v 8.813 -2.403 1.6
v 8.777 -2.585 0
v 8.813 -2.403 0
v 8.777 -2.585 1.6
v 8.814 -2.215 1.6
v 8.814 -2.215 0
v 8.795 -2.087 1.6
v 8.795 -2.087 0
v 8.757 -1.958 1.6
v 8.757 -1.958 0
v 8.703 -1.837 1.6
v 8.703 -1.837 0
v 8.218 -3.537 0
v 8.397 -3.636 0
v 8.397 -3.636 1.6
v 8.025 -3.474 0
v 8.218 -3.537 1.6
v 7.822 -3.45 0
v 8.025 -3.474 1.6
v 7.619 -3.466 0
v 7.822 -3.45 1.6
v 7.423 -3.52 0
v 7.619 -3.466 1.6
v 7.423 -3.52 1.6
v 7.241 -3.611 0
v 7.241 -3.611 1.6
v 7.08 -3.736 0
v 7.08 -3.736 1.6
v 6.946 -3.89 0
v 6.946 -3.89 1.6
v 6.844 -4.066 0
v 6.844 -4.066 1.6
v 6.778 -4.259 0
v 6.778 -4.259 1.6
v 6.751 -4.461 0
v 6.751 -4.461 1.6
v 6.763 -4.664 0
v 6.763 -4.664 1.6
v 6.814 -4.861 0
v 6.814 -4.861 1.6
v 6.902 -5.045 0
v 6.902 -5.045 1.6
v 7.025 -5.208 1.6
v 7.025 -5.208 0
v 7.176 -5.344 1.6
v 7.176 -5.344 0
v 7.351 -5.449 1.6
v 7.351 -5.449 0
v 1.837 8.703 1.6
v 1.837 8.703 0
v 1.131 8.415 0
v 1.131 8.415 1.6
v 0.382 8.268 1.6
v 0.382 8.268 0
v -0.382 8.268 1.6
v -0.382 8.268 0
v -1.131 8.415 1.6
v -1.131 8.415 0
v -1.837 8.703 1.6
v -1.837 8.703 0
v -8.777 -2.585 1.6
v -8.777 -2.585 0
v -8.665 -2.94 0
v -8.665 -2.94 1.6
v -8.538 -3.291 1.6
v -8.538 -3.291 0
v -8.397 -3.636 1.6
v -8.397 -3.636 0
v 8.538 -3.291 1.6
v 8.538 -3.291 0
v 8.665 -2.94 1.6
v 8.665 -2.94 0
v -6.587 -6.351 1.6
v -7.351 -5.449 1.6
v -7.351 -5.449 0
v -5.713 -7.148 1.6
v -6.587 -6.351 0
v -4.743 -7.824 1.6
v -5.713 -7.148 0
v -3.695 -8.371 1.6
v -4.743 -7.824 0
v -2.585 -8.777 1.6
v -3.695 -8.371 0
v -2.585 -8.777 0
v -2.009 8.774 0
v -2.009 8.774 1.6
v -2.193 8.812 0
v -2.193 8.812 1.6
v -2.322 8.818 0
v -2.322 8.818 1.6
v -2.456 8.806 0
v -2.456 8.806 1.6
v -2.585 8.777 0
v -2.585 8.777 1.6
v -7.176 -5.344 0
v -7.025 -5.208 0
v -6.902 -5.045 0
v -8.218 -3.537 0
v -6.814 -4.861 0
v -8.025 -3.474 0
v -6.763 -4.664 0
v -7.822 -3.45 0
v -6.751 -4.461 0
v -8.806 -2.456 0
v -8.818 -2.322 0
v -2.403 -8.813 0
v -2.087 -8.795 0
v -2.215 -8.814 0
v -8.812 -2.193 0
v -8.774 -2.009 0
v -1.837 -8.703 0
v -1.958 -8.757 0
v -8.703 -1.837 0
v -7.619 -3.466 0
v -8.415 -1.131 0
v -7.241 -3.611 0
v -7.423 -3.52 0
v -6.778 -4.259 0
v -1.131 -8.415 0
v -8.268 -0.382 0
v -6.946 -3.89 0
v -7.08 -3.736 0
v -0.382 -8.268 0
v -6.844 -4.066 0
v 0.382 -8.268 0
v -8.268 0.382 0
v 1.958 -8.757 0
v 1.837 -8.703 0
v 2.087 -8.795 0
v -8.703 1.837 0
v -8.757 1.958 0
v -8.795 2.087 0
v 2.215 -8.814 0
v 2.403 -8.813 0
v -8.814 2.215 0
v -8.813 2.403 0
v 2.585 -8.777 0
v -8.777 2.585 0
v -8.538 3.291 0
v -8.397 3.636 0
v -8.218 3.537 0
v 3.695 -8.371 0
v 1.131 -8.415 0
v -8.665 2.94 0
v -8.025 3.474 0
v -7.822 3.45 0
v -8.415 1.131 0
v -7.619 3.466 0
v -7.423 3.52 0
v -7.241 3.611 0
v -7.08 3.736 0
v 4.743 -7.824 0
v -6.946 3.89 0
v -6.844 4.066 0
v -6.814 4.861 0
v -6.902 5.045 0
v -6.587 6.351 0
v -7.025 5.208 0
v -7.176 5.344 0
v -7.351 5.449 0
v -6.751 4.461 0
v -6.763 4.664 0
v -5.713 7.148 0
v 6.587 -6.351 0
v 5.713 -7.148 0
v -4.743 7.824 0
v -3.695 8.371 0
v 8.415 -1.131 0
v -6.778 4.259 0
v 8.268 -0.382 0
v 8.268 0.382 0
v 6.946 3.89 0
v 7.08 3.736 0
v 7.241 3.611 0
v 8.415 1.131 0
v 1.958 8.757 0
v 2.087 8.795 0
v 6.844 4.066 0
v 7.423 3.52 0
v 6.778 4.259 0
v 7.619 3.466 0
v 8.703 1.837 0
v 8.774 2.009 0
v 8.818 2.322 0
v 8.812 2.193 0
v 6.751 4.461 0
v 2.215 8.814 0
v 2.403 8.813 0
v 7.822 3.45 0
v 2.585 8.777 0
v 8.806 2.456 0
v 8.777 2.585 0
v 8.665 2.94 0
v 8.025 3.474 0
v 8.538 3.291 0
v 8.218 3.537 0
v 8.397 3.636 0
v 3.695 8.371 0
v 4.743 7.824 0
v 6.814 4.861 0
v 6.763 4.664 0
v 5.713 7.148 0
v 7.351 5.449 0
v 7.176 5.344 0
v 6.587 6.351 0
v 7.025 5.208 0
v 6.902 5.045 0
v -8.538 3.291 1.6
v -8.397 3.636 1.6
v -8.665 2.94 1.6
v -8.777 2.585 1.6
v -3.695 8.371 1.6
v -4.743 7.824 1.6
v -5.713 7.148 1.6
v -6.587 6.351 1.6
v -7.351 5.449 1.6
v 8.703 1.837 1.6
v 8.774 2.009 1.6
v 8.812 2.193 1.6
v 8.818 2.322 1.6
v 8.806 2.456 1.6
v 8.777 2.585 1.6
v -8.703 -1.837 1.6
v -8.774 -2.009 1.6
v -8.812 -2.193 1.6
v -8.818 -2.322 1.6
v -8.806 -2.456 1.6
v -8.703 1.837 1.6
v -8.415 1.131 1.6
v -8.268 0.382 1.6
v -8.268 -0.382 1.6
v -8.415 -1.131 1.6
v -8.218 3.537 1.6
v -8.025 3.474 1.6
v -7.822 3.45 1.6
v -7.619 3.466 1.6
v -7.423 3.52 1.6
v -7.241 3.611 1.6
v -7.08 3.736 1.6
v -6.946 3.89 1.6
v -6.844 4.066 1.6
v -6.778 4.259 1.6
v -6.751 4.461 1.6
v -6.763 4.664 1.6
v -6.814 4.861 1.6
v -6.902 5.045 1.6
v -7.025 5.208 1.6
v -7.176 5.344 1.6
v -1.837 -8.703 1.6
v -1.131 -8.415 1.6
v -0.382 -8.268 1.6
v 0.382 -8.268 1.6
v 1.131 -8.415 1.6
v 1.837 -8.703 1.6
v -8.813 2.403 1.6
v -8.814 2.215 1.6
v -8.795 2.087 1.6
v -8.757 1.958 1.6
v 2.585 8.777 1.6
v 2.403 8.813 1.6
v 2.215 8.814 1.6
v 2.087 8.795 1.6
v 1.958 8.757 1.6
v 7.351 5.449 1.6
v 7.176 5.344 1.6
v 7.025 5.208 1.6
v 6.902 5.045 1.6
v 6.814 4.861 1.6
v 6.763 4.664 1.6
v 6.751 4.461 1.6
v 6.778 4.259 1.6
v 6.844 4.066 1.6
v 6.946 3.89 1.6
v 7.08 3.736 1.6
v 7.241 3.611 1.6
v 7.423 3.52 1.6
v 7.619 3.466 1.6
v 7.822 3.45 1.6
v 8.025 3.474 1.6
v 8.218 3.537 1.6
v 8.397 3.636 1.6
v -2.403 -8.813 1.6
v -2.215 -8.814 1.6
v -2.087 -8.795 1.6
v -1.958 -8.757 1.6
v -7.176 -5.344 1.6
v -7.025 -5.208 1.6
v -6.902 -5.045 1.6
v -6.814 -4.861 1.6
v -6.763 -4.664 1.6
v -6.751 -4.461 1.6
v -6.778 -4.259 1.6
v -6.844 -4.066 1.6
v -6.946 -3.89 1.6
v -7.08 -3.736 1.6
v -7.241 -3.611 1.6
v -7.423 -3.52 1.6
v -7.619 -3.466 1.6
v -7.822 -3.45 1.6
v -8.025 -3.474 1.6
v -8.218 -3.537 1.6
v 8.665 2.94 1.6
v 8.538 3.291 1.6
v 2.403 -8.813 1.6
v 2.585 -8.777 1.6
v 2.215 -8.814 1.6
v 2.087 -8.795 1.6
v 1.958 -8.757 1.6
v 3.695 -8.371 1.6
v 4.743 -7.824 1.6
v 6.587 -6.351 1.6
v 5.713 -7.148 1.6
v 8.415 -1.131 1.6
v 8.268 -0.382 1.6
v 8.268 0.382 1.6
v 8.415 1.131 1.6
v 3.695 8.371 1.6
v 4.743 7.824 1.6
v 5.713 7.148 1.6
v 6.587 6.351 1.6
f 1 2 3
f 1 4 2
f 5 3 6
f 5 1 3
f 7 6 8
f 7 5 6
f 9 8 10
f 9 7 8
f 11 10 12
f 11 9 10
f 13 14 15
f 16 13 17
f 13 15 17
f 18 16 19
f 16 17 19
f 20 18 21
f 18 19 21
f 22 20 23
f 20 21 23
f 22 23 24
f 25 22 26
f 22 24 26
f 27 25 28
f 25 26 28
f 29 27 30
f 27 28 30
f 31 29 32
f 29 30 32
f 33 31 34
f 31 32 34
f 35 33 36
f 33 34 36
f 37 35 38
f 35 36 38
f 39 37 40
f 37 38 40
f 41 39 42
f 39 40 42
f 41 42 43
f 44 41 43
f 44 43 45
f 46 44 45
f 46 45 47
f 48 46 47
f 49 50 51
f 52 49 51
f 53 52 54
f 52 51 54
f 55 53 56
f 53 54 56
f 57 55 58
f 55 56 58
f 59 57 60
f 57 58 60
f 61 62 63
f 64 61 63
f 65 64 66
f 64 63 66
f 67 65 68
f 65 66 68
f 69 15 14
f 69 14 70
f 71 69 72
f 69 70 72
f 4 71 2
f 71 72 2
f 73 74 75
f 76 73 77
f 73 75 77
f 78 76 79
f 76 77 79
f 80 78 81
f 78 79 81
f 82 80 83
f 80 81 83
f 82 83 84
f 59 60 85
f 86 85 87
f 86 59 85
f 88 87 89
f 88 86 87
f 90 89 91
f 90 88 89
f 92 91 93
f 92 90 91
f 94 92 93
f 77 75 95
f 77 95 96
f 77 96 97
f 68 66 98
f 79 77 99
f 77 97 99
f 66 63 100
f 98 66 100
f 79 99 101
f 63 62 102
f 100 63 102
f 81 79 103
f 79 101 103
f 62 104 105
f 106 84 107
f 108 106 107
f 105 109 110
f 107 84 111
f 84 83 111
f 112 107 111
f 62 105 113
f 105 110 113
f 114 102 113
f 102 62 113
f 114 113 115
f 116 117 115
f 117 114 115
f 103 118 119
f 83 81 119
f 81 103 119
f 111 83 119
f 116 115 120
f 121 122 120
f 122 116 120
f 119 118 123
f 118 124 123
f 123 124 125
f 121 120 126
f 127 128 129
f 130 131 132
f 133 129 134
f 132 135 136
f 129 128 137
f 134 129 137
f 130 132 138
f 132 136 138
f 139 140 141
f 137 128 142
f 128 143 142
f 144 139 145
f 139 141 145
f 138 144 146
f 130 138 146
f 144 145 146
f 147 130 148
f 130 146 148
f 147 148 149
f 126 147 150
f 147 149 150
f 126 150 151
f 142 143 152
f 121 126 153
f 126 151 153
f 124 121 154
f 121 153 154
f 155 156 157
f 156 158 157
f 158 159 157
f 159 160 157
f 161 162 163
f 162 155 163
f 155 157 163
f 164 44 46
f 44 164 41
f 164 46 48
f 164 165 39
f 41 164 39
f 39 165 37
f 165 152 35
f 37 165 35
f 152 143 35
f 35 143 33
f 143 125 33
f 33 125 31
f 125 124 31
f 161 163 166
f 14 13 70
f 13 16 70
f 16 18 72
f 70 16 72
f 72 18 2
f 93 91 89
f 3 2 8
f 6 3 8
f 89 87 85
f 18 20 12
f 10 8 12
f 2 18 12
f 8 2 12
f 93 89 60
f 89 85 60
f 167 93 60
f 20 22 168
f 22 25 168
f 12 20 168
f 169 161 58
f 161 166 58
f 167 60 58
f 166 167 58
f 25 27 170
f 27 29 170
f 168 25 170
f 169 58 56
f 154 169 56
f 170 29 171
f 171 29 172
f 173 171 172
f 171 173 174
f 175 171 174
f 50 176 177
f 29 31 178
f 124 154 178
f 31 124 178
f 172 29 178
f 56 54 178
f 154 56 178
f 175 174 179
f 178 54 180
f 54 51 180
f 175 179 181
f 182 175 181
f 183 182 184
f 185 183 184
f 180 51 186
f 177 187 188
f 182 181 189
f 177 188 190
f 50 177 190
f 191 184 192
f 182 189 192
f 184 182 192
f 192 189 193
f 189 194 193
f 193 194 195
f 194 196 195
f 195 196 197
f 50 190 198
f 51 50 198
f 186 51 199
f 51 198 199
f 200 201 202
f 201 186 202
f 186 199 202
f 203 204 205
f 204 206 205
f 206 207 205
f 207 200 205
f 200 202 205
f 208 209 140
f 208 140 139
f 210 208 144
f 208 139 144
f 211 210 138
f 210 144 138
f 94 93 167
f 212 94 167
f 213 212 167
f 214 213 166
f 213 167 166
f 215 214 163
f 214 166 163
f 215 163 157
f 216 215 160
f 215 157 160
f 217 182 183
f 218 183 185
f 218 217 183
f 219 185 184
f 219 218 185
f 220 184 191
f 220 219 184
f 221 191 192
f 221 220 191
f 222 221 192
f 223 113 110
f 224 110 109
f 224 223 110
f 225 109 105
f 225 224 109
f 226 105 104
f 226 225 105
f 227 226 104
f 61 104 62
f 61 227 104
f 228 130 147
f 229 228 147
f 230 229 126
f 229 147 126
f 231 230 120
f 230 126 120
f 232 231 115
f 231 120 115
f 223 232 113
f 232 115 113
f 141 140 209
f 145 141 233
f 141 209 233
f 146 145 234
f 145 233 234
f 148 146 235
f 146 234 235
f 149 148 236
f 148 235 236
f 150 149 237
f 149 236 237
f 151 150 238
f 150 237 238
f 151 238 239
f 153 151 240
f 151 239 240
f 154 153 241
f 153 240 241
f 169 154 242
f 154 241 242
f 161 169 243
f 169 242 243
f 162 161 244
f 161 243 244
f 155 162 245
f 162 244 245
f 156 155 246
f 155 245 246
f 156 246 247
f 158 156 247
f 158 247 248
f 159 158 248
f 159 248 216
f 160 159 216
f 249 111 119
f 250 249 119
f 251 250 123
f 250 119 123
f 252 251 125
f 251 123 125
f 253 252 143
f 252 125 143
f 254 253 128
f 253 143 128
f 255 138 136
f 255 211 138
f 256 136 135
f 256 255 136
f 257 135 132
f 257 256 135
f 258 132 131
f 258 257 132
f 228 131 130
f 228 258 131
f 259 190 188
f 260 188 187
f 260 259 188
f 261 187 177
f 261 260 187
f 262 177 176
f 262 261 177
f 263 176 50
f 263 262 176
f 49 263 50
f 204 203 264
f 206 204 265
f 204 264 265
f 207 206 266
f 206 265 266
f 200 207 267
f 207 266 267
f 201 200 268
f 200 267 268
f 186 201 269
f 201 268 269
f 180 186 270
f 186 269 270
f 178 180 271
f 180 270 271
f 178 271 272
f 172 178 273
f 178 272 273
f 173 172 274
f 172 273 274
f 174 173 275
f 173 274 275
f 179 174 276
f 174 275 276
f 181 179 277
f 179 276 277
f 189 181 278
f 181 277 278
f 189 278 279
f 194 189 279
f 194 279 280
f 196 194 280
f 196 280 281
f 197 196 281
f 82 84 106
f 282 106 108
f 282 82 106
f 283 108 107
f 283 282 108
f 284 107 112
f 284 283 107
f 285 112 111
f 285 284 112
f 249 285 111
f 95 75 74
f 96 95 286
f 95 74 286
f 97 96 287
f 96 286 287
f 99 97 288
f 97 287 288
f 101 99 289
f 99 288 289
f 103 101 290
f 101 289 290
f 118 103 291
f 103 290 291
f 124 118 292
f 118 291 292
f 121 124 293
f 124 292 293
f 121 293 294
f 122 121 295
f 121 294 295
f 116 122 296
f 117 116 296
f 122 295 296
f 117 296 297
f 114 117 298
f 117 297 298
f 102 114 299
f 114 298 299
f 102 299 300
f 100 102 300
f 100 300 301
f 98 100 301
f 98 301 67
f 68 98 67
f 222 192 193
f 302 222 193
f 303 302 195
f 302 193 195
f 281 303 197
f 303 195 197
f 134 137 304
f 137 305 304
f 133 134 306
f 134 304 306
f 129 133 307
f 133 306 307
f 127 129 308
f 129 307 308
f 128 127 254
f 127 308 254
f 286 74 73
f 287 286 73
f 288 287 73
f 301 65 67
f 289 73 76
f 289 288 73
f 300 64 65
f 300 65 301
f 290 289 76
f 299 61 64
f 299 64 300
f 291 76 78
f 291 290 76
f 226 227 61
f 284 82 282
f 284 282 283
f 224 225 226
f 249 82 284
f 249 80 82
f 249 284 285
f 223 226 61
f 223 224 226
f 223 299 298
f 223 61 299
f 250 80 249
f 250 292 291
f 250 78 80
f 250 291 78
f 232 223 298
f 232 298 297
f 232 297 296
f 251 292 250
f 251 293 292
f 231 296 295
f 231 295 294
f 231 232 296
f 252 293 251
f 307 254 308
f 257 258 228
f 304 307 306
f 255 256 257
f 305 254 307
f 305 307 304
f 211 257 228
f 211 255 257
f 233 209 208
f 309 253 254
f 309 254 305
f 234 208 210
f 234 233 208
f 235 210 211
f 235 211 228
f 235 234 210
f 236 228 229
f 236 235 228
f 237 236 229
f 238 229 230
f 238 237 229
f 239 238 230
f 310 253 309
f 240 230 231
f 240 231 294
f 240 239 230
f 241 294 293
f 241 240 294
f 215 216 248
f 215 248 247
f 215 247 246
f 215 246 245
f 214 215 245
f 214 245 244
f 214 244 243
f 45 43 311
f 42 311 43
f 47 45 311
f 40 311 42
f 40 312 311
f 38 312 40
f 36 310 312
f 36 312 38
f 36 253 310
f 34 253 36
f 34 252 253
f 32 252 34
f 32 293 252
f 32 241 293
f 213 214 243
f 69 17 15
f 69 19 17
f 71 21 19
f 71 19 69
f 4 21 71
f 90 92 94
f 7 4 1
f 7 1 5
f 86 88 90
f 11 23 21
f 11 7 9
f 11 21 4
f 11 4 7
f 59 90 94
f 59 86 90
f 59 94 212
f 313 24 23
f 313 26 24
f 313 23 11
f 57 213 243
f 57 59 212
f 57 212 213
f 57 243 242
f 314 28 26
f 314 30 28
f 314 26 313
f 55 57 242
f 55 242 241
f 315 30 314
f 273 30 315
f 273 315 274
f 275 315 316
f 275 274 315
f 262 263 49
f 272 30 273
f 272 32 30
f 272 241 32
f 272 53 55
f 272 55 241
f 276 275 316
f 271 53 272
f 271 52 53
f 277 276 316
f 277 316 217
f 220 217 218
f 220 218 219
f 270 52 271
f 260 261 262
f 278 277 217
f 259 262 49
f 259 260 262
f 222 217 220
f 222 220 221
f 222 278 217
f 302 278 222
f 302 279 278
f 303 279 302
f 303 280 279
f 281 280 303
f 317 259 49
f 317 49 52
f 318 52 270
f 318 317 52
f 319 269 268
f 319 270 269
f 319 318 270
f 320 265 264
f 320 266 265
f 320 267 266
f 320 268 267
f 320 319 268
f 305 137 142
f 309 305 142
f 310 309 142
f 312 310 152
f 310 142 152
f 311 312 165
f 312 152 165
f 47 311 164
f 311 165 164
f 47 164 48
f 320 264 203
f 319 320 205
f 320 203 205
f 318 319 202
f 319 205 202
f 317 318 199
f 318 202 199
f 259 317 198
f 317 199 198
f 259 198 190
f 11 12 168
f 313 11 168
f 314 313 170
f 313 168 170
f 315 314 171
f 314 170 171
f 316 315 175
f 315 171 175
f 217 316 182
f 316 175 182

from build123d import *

# Parameters (mm, degrees)
BOSS_EXTRUDE1_DEPTH = 1.6
FILLET1_R           = 1
SKETCH2_R           = 1.05
CUT_EXTRUDE1_DEPTH  = 13.572804314


with BuildPart() as part:
    # Sketch1 → Boss-Extrude1 (new body)
    with BuildSketch(Plane.XY):
        with BuildLine():
            ThreePointArc((2.158317505, -8.891803279), (6.470027048, -6.470027048), (8.891803279, -2.158317505))
            ThreePointArc((8.891803279, -2.158317505), (8.25, 0), (8.891803279, 2.158317505))
            ThreePointArc((8.891803279, 2.158317505), (6.470027048, 6.470027048), (2.158317505, 8.891803279))
            ThreePointArc((2.158317505, 8.891803279), (0, 8.25), (-2.158317505, 8.891803279))
            ThreePointArc((-2.158317505, 8.891803279), (-6.470027048, 6.470027048), (-8.891803279, 2.158317505))
            ThreePointArc((-8.891803279, 2.158317505), (-8.25, 0), (-8.891803279, -2.158317505))
            ThreePointArc((-8.891803279, -2.158317505), (-6.470027048, -6.470027048), (-2.158317505, -8.891803279))
            ThreePointArc((-2.158317505, -8.891803279), (0, -8.25), (2.158317505, -8.891803279))
        make_face()
    extrude(amount=BOSS_EXTRUDE1_DEPTH)

    # Fillet1
    fillet1_edges = [part.edges().sort_by_distance(p)[0] for p in [
        (-2.158317505, -8.891803279, 0.8),
        (-8.891803279, -2.158317505, 0.8),
        (-8.891803279, 2.158317505, 0.8),
        (-2.158317505, 8.891803279, 0.8),
        (2.158317505, 8.891803279, 0.8),
        (8.891803279, 2.158317505, 0.8),
        (8.891803279, -2.158317505, 0.8),
        (2.158317505, -8.891803279, 0.8),
    ]]
    fillet(fillet1_edges, radius=FILLET1_R)

    # Sketch2 → Cut-Extrude1 (cut, through all)
    with BuildSketch(Plane.XY.offset(1.6)):
        with Locations((7.8, 4.5)):
            Circle(SKETCH2_R)
        with Locations((7.8, -4.5)):
            Circle(SKETCH2_R)
        with Locations((-7.8, -4.5)):
            Circle(SKETCH2_R)
        with Locations((-7.8, 4.5)):
            Circle(SKETCH2_R)
    extrude(amount=-CUT_EXTRUDE1_DEPTH, mode=Mode.SUBTRACT)


solid = part.part
